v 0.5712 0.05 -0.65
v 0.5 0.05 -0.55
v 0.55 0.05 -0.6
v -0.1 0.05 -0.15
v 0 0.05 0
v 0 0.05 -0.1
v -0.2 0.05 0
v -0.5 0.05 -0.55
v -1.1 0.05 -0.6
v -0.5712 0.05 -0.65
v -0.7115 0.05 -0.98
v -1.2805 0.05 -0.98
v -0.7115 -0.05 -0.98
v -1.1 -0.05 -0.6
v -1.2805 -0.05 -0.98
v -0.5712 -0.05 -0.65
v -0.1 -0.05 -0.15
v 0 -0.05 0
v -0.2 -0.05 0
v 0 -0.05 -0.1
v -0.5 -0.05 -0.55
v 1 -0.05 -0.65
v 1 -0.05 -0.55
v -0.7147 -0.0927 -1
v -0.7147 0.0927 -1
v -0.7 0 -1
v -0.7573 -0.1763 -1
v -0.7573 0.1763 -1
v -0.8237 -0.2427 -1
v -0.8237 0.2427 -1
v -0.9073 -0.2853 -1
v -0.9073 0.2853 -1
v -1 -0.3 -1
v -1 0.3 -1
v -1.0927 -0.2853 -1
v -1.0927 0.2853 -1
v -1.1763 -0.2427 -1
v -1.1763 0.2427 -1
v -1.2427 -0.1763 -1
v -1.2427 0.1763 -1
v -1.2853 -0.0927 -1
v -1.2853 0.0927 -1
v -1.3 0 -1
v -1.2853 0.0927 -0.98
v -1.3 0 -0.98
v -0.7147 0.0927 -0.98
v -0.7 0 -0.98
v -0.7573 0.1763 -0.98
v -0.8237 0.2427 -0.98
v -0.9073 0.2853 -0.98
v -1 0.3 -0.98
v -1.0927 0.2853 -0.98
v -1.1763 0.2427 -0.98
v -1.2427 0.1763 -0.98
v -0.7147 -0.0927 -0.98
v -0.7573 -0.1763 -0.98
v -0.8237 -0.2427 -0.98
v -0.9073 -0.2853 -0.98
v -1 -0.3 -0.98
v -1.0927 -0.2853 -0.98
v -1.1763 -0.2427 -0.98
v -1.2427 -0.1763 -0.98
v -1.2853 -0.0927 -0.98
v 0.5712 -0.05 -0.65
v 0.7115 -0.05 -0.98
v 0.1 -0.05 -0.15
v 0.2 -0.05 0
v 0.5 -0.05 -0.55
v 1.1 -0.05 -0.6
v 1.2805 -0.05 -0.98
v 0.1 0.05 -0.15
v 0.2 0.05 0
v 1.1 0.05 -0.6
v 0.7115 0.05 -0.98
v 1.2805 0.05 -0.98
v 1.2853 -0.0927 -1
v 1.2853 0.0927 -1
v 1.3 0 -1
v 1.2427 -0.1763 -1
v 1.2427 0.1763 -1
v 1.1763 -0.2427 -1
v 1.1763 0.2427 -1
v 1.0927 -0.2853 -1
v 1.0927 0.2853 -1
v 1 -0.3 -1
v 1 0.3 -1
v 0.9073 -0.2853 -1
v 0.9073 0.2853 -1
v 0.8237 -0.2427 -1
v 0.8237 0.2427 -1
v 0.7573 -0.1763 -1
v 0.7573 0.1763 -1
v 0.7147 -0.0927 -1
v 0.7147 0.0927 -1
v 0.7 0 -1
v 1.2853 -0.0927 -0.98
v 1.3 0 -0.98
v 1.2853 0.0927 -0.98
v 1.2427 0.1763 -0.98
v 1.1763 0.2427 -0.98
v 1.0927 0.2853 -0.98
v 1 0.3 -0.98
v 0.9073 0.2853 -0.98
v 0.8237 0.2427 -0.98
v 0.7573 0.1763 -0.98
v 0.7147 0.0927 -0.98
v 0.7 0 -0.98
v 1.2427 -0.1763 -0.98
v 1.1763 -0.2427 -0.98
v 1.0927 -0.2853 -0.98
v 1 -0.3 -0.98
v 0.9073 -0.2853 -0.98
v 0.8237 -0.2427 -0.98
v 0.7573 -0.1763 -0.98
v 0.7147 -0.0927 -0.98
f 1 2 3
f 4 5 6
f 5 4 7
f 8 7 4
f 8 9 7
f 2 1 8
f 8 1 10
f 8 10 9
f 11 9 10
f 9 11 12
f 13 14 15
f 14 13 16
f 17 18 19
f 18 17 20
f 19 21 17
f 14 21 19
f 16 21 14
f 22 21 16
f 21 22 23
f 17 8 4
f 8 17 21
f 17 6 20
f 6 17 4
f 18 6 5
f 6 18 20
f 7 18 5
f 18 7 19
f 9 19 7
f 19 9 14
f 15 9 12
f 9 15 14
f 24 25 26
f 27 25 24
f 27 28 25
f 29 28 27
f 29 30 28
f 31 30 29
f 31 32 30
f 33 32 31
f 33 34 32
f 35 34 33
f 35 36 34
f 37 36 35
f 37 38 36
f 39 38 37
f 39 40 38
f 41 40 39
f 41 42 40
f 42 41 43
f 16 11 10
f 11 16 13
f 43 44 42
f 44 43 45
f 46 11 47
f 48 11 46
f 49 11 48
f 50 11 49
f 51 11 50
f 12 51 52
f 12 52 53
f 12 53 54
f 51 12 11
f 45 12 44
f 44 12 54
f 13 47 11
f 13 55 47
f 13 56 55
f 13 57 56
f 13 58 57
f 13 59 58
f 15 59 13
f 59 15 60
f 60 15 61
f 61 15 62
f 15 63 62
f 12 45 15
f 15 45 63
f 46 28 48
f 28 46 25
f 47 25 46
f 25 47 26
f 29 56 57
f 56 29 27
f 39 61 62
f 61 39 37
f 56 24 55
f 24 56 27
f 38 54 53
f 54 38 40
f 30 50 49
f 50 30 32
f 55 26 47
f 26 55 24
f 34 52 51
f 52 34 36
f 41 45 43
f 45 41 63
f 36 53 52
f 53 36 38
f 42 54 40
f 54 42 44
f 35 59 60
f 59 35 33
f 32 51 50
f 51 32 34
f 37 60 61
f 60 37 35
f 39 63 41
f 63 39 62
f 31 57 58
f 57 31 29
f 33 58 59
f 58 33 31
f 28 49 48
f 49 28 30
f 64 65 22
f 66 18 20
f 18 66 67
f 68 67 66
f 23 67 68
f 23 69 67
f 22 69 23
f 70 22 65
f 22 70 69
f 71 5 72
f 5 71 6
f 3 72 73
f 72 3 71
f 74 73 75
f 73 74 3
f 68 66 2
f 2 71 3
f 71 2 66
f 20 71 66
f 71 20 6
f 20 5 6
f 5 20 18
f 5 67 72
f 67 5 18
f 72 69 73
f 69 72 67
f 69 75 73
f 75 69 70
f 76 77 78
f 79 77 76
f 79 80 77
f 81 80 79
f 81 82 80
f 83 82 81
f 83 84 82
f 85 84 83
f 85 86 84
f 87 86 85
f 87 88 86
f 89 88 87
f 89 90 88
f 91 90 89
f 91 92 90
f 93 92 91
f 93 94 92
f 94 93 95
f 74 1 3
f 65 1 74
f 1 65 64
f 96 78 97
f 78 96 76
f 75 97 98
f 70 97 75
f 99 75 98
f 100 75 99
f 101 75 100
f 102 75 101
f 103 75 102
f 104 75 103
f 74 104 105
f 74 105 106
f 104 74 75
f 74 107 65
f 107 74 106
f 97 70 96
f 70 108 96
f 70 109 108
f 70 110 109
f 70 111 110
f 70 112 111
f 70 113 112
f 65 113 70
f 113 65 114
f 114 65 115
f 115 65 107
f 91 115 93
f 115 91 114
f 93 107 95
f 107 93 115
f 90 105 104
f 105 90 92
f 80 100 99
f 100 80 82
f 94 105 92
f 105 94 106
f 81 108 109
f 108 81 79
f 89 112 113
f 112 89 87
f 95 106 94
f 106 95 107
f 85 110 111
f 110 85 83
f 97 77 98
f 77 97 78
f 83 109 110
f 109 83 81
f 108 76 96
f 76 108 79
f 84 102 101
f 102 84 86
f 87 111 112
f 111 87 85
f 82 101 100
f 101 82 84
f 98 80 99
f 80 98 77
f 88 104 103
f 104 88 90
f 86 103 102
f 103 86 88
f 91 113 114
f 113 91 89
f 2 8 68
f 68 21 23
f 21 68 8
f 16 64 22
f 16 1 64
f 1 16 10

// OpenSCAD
//----------------------------------------------
// Freeform Support bridge double
//----------------------------------------------
$fn=20;

translate([-0.5,-0.5,-1.0]) bridge();

module bridge(){
    union() {
       translate([-0.1,0,0.0]) pilar();
       translate([1.1,1,0.0]) rotate([0, 0, 180]) pilar();
       translate([0.5,0.5,0.4]) cube([2,0.1,0.1],true);
    }
}
module pilar(){
union() {
    translate([0.5,0.55,0.0]) rotate([90, 0, 0]) {
			linear_extrude(height=0.1) {
				polygon(points=[[-0.62,0],[-1.19,0],[-1,0.4],[-0.1,1],[0.1,1],[0.1,0.9],[0,0.85],[-0.45,0.4]], convexity=1);
			}
		}
    translate([-0.4,0.5,0.0]) cylinder ( h = 0.02, r = 0.3, center = false);
}
}
